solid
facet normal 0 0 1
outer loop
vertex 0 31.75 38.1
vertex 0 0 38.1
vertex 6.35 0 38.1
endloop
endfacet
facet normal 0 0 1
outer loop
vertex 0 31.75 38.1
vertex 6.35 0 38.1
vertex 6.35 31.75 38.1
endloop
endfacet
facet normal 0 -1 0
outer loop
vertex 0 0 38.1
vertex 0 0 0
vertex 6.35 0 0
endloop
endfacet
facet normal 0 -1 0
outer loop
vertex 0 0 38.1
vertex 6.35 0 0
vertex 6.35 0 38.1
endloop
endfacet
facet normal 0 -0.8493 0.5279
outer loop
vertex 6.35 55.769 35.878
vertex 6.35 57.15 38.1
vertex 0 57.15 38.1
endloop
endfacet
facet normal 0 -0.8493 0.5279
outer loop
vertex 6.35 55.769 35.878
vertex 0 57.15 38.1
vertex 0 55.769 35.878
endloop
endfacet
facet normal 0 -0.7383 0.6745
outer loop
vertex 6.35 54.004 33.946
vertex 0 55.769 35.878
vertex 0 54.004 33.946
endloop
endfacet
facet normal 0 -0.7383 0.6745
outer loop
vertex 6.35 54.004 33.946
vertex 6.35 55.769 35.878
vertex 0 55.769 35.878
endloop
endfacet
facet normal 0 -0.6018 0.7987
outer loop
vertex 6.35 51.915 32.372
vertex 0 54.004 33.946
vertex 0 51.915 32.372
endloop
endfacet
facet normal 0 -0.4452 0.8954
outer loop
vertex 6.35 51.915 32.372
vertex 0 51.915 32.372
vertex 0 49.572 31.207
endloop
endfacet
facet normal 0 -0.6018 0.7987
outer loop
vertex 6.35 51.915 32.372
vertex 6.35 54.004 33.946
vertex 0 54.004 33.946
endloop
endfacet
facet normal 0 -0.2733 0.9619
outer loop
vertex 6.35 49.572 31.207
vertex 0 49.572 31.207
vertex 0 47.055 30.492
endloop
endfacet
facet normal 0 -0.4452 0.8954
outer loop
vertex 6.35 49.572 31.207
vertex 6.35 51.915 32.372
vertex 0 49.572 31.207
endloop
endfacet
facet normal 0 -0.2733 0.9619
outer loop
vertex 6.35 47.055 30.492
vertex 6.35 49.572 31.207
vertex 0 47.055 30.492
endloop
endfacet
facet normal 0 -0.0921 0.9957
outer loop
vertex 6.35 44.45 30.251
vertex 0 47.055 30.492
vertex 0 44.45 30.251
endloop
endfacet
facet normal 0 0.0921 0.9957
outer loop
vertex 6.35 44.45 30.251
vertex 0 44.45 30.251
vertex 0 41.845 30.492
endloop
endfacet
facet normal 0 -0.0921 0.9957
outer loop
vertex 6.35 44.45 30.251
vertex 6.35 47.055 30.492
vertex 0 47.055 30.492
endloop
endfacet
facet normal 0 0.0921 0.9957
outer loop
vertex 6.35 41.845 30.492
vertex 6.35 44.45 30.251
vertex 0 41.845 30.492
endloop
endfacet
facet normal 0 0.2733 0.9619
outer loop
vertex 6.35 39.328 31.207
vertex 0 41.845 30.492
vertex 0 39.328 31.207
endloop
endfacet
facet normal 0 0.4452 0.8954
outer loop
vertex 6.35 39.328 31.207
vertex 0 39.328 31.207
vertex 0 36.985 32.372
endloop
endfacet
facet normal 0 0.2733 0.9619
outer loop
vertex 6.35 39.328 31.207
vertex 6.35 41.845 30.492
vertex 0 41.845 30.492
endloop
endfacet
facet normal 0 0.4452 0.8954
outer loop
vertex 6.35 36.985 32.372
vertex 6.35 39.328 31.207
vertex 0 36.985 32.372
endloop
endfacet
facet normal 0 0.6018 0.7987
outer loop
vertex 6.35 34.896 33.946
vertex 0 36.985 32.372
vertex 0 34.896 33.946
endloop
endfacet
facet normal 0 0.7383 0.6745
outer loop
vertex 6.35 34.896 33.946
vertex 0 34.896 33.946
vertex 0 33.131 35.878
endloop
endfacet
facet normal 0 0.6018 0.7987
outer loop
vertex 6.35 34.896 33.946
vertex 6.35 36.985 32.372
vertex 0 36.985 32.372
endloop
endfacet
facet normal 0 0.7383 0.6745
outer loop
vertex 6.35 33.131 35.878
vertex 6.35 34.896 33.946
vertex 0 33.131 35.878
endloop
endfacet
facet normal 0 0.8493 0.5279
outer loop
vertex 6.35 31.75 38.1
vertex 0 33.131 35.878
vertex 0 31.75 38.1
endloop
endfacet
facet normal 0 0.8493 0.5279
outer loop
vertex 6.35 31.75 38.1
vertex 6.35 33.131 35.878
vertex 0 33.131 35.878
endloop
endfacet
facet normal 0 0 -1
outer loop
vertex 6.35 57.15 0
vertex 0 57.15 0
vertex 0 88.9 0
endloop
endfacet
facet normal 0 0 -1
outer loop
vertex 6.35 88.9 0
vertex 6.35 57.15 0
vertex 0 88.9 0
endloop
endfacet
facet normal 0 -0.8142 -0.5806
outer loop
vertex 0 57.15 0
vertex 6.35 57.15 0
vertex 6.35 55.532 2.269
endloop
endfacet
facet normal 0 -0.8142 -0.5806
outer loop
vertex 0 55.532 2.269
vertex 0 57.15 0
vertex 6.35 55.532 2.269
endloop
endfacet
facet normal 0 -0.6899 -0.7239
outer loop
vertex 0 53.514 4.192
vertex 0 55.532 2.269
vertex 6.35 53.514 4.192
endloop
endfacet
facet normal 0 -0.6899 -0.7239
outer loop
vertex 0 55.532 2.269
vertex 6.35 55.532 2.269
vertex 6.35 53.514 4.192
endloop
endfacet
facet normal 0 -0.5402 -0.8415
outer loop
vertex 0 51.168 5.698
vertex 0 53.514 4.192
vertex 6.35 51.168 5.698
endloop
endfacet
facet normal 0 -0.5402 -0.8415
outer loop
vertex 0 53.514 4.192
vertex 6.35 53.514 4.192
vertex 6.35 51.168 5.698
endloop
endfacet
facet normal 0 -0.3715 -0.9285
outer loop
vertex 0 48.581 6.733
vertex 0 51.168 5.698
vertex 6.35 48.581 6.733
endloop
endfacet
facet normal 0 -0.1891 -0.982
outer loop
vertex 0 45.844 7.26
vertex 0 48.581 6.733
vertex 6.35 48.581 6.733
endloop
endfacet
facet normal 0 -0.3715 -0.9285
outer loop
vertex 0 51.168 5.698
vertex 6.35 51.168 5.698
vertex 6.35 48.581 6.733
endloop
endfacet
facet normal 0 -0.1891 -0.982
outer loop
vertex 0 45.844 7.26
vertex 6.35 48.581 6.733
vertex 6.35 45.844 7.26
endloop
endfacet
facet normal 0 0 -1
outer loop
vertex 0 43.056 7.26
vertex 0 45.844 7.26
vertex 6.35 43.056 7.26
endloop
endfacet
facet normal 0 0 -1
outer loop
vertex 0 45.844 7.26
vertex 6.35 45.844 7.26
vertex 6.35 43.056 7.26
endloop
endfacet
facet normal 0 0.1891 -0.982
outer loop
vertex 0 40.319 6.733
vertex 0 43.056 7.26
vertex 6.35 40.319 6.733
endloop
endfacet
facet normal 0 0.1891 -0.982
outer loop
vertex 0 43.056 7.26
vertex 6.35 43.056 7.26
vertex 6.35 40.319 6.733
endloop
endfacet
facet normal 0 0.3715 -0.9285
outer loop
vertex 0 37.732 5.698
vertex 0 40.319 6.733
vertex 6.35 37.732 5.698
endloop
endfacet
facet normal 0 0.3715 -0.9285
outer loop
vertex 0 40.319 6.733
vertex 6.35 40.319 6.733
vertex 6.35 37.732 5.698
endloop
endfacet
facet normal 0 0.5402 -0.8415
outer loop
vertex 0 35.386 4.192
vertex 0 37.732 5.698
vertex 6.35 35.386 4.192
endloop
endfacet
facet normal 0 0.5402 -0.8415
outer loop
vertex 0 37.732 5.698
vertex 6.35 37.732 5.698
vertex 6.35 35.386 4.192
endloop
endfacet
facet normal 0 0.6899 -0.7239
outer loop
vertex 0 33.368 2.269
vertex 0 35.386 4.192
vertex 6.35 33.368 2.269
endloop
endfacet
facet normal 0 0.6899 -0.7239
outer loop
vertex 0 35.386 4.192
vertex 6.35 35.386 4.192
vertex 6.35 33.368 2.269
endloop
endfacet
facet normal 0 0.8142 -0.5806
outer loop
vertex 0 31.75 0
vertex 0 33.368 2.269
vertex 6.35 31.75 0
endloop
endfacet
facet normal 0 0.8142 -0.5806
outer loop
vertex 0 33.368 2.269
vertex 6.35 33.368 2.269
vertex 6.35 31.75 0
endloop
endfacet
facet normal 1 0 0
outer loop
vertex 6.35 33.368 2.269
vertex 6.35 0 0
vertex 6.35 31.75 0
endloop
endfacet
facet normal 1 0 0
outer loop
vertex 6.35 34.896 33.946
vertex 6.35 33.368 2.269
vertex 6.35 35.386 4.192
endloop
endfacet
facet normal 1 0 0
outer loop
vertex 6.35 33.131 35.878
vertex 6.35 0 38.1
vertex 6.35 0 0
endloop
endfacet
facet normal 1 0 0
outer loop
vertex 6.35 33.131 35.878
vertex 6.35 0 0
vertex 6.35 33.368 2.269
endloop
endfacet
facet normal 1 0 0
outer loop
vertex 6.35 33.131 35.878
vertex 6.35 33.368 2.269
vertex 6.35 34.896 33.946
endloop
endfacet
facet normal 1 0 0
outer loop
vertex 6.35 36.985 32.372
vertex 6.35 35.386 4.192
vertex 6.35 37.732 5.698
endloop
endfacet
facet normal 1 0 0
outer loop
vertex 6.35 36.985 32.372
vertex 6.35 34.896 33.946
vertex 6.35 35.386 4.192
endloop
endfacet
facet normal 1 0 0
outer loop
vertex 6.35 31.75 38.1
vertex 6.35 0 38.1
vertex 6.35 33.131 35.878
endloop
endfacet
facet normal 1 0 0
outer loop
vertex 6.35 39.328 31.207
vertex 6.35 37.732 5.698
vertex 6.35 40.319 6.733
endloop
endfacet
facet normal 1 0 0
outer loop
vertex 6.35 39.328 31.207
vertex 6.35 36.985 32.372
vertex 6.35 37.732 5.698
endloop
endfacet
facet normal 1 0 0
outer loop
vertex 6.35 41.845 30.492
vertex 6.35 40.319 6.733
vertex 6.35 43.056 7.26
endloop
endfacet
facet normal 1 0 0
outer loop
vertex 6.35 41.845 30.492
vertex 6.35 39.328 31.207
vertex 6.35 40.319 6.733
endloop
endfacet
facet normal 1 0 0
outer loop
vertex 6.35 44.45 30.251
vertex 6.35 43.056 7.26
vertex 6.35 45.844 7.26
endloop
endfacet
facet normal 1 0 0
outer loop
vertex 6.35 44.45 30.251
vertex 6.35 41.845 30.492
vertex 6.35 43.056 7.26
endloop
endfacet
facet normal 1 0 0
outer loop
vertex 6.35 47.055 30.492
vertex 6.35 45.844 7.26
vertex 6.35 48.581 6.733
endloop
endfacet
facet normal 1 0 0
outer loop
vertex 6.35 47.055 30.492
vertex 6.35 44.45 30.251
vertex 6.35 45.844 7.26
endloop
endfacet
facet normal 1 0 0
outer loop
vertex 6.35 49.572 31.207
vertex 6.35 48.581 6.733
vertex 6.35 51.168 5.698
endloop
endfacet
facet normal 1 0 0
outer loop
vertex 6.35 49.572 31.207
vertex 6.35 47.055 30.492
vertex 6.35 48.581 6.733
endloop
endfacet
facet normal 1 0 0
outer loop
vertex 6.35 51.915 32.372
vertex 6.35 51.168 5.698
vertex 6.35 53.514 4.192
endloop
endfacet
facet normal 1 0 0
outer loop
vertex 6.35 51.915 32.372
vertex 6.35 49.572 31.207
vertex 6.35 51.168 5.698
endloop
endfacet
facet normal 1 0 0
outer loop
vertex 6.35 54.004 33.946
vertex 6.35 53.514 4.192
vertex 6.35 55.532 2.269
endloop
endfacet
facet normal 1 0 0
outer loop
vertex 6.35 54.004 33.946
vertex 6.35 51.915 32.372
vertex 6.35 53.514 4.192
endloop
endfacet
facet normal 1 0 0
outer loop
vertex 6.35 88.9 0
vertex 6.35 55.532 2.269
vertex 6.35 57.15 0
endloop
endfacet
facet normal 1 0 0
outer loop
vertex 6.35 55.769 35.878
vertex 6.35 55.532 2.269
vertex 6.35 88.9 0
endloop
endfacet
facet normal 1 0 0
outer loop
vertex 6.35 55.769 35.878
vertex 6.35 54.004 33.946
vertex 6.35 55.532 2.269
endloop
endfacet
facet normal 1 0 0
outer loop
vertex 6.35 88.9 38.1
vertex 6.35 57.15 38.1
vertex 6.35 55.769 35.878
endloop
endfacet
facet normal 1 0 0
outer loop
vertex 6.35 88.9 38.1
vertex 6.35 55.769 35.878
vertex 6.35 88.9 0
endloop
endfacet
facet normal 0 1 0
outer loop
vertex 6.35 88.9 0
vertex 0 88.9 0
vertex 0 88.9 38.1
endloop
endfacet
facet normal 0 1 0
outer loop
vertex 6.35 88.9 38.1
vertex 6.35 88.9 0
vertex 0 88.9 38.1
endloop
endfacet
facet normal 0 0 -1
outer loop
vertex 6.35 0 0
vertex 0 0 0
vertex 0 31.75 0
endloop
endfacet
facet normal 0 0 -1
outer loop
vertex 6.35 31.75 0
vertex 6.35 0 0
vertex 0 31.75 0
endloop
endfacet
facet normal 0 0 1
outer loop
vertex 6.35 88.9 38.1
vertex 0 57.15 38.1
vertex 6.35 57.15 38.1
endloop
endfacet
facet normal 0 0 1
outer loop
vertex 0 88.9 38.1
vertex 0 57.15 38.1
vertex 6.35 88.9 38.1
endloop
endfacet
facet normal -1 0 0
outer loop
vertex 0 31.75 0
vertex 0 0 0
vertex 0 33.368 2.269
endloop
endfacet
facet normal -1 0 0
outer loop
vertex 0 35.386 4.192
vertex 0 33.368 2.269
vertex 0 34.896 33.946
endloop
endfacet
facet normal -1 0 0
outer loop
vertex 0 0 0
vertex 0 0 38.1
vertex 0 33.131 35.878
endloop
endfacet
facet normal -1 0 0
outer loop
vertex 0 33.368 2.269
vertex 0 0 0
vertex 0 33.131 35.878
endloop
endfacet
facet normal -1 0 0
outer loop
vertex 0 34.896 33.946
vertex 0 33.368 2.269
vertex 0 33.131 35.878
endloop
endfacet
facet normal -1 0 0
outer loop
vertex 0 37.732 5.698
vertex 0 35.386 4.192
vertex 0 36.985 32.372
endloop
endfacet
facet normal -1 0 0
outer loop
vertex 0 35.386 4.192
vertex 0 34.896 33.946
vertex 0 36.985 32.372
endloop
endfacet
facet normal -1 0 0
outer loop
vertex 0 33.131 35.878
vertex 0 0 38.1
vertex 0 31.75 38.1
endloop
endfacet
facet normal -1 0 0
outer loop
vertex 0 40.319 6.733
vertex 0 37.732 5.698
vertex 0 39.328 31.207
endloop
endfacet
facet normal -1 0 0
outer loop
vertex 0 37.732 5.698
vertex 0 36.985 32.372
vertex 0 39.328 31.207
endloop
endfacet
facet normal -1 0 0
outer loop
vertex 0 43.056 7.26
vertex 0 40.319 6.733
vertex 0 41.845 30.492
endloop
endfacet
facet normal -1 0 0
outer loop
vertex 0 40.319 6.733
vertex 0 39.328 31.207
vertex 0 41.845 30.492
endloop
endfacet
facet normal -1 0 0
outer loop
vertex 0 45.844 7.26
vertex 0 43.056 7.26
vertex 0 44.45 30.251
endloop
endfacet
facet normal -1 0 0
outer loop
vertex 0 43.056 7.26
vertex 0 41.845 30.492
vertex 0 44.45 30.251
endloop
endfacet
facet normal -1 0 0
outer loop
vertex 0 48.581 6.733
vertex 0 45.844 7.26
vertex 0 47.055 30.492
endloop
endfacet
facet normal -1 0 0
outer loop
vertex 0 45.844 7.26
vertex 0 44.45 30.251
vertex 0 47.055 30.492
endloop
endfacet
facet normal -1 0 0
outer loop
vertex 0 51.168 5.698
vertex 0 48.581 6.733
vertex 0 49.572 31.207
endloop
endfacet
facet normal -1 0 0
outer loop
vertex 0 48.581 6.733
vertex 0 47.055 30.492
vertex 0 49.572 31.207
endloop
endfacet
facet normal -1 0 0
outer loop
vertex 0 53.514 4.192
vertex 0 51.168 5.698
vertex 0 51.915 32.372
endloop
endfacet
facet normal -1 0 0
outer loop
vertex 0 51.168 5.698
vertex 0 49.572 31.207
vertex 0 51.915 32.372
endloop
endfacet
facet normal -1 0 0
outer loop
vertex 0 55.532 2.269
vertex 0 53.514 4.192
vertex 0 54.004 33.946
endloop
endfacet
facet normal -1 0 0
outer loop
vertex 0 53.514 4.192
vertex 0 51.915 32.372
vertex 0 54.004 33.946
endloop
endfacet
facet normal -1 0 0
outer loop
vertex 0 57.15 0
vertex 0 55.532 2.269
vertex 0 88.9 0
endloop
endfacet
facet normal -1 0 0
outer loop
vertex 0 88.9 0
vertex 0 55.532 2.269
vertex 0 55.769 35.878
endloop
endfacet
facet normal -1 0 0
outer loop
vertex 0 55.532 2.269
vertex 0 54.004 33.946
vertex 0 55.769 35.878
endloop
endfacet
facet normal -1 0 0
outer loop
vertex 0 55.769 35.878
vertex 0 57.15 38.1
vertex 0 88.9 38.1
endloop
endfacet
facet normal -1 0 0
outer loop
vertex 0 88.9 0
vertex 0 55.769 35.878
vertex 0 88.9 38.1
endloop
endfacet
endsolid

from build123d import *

# Parameters (mm, degrees)
SKETCH1_W           = 88.9
SKETCH1_H           = 38.1
BOSS_EXTRUDE1_DEPTH = 6.35
CUT_EXTRUDE2_DEPTH  = 6.35


with BuildPart() as part:
    # Sketch1 → Boss-Extrude1 (new body)
    with BuildSketch(Plane.YZ):
        with Locations((44.45, 19.05)):
            Rectangle(SKETCH1_W, SKETCH1_H)
    extrude(amount=BOSS_EXTRUDE1_DEPTH)

    # Sketch2 → Cut-Extrude2 (cut)
    with BuildSketch(Plane.YZ.offset(6.35)):
        with BuildLine():
            Line((31.75, 38.1), (57.15, 38.1))
            ThreePointArc((57.15, 38.1), (44.45, 30.250968343), (31.75, 38.1))
        make_face()
        with BuildLine():
            Line((31.75, 0), (57.15, 0))
            ThreePointArc((57.15, 0), (44.45, 7.326494526), (31.75, 0))
        make_face()
    extrude(amount=-CUT_EXTRUDE2_DEPTH, mode=Mode.SUBTRACT)


solid = part.part
